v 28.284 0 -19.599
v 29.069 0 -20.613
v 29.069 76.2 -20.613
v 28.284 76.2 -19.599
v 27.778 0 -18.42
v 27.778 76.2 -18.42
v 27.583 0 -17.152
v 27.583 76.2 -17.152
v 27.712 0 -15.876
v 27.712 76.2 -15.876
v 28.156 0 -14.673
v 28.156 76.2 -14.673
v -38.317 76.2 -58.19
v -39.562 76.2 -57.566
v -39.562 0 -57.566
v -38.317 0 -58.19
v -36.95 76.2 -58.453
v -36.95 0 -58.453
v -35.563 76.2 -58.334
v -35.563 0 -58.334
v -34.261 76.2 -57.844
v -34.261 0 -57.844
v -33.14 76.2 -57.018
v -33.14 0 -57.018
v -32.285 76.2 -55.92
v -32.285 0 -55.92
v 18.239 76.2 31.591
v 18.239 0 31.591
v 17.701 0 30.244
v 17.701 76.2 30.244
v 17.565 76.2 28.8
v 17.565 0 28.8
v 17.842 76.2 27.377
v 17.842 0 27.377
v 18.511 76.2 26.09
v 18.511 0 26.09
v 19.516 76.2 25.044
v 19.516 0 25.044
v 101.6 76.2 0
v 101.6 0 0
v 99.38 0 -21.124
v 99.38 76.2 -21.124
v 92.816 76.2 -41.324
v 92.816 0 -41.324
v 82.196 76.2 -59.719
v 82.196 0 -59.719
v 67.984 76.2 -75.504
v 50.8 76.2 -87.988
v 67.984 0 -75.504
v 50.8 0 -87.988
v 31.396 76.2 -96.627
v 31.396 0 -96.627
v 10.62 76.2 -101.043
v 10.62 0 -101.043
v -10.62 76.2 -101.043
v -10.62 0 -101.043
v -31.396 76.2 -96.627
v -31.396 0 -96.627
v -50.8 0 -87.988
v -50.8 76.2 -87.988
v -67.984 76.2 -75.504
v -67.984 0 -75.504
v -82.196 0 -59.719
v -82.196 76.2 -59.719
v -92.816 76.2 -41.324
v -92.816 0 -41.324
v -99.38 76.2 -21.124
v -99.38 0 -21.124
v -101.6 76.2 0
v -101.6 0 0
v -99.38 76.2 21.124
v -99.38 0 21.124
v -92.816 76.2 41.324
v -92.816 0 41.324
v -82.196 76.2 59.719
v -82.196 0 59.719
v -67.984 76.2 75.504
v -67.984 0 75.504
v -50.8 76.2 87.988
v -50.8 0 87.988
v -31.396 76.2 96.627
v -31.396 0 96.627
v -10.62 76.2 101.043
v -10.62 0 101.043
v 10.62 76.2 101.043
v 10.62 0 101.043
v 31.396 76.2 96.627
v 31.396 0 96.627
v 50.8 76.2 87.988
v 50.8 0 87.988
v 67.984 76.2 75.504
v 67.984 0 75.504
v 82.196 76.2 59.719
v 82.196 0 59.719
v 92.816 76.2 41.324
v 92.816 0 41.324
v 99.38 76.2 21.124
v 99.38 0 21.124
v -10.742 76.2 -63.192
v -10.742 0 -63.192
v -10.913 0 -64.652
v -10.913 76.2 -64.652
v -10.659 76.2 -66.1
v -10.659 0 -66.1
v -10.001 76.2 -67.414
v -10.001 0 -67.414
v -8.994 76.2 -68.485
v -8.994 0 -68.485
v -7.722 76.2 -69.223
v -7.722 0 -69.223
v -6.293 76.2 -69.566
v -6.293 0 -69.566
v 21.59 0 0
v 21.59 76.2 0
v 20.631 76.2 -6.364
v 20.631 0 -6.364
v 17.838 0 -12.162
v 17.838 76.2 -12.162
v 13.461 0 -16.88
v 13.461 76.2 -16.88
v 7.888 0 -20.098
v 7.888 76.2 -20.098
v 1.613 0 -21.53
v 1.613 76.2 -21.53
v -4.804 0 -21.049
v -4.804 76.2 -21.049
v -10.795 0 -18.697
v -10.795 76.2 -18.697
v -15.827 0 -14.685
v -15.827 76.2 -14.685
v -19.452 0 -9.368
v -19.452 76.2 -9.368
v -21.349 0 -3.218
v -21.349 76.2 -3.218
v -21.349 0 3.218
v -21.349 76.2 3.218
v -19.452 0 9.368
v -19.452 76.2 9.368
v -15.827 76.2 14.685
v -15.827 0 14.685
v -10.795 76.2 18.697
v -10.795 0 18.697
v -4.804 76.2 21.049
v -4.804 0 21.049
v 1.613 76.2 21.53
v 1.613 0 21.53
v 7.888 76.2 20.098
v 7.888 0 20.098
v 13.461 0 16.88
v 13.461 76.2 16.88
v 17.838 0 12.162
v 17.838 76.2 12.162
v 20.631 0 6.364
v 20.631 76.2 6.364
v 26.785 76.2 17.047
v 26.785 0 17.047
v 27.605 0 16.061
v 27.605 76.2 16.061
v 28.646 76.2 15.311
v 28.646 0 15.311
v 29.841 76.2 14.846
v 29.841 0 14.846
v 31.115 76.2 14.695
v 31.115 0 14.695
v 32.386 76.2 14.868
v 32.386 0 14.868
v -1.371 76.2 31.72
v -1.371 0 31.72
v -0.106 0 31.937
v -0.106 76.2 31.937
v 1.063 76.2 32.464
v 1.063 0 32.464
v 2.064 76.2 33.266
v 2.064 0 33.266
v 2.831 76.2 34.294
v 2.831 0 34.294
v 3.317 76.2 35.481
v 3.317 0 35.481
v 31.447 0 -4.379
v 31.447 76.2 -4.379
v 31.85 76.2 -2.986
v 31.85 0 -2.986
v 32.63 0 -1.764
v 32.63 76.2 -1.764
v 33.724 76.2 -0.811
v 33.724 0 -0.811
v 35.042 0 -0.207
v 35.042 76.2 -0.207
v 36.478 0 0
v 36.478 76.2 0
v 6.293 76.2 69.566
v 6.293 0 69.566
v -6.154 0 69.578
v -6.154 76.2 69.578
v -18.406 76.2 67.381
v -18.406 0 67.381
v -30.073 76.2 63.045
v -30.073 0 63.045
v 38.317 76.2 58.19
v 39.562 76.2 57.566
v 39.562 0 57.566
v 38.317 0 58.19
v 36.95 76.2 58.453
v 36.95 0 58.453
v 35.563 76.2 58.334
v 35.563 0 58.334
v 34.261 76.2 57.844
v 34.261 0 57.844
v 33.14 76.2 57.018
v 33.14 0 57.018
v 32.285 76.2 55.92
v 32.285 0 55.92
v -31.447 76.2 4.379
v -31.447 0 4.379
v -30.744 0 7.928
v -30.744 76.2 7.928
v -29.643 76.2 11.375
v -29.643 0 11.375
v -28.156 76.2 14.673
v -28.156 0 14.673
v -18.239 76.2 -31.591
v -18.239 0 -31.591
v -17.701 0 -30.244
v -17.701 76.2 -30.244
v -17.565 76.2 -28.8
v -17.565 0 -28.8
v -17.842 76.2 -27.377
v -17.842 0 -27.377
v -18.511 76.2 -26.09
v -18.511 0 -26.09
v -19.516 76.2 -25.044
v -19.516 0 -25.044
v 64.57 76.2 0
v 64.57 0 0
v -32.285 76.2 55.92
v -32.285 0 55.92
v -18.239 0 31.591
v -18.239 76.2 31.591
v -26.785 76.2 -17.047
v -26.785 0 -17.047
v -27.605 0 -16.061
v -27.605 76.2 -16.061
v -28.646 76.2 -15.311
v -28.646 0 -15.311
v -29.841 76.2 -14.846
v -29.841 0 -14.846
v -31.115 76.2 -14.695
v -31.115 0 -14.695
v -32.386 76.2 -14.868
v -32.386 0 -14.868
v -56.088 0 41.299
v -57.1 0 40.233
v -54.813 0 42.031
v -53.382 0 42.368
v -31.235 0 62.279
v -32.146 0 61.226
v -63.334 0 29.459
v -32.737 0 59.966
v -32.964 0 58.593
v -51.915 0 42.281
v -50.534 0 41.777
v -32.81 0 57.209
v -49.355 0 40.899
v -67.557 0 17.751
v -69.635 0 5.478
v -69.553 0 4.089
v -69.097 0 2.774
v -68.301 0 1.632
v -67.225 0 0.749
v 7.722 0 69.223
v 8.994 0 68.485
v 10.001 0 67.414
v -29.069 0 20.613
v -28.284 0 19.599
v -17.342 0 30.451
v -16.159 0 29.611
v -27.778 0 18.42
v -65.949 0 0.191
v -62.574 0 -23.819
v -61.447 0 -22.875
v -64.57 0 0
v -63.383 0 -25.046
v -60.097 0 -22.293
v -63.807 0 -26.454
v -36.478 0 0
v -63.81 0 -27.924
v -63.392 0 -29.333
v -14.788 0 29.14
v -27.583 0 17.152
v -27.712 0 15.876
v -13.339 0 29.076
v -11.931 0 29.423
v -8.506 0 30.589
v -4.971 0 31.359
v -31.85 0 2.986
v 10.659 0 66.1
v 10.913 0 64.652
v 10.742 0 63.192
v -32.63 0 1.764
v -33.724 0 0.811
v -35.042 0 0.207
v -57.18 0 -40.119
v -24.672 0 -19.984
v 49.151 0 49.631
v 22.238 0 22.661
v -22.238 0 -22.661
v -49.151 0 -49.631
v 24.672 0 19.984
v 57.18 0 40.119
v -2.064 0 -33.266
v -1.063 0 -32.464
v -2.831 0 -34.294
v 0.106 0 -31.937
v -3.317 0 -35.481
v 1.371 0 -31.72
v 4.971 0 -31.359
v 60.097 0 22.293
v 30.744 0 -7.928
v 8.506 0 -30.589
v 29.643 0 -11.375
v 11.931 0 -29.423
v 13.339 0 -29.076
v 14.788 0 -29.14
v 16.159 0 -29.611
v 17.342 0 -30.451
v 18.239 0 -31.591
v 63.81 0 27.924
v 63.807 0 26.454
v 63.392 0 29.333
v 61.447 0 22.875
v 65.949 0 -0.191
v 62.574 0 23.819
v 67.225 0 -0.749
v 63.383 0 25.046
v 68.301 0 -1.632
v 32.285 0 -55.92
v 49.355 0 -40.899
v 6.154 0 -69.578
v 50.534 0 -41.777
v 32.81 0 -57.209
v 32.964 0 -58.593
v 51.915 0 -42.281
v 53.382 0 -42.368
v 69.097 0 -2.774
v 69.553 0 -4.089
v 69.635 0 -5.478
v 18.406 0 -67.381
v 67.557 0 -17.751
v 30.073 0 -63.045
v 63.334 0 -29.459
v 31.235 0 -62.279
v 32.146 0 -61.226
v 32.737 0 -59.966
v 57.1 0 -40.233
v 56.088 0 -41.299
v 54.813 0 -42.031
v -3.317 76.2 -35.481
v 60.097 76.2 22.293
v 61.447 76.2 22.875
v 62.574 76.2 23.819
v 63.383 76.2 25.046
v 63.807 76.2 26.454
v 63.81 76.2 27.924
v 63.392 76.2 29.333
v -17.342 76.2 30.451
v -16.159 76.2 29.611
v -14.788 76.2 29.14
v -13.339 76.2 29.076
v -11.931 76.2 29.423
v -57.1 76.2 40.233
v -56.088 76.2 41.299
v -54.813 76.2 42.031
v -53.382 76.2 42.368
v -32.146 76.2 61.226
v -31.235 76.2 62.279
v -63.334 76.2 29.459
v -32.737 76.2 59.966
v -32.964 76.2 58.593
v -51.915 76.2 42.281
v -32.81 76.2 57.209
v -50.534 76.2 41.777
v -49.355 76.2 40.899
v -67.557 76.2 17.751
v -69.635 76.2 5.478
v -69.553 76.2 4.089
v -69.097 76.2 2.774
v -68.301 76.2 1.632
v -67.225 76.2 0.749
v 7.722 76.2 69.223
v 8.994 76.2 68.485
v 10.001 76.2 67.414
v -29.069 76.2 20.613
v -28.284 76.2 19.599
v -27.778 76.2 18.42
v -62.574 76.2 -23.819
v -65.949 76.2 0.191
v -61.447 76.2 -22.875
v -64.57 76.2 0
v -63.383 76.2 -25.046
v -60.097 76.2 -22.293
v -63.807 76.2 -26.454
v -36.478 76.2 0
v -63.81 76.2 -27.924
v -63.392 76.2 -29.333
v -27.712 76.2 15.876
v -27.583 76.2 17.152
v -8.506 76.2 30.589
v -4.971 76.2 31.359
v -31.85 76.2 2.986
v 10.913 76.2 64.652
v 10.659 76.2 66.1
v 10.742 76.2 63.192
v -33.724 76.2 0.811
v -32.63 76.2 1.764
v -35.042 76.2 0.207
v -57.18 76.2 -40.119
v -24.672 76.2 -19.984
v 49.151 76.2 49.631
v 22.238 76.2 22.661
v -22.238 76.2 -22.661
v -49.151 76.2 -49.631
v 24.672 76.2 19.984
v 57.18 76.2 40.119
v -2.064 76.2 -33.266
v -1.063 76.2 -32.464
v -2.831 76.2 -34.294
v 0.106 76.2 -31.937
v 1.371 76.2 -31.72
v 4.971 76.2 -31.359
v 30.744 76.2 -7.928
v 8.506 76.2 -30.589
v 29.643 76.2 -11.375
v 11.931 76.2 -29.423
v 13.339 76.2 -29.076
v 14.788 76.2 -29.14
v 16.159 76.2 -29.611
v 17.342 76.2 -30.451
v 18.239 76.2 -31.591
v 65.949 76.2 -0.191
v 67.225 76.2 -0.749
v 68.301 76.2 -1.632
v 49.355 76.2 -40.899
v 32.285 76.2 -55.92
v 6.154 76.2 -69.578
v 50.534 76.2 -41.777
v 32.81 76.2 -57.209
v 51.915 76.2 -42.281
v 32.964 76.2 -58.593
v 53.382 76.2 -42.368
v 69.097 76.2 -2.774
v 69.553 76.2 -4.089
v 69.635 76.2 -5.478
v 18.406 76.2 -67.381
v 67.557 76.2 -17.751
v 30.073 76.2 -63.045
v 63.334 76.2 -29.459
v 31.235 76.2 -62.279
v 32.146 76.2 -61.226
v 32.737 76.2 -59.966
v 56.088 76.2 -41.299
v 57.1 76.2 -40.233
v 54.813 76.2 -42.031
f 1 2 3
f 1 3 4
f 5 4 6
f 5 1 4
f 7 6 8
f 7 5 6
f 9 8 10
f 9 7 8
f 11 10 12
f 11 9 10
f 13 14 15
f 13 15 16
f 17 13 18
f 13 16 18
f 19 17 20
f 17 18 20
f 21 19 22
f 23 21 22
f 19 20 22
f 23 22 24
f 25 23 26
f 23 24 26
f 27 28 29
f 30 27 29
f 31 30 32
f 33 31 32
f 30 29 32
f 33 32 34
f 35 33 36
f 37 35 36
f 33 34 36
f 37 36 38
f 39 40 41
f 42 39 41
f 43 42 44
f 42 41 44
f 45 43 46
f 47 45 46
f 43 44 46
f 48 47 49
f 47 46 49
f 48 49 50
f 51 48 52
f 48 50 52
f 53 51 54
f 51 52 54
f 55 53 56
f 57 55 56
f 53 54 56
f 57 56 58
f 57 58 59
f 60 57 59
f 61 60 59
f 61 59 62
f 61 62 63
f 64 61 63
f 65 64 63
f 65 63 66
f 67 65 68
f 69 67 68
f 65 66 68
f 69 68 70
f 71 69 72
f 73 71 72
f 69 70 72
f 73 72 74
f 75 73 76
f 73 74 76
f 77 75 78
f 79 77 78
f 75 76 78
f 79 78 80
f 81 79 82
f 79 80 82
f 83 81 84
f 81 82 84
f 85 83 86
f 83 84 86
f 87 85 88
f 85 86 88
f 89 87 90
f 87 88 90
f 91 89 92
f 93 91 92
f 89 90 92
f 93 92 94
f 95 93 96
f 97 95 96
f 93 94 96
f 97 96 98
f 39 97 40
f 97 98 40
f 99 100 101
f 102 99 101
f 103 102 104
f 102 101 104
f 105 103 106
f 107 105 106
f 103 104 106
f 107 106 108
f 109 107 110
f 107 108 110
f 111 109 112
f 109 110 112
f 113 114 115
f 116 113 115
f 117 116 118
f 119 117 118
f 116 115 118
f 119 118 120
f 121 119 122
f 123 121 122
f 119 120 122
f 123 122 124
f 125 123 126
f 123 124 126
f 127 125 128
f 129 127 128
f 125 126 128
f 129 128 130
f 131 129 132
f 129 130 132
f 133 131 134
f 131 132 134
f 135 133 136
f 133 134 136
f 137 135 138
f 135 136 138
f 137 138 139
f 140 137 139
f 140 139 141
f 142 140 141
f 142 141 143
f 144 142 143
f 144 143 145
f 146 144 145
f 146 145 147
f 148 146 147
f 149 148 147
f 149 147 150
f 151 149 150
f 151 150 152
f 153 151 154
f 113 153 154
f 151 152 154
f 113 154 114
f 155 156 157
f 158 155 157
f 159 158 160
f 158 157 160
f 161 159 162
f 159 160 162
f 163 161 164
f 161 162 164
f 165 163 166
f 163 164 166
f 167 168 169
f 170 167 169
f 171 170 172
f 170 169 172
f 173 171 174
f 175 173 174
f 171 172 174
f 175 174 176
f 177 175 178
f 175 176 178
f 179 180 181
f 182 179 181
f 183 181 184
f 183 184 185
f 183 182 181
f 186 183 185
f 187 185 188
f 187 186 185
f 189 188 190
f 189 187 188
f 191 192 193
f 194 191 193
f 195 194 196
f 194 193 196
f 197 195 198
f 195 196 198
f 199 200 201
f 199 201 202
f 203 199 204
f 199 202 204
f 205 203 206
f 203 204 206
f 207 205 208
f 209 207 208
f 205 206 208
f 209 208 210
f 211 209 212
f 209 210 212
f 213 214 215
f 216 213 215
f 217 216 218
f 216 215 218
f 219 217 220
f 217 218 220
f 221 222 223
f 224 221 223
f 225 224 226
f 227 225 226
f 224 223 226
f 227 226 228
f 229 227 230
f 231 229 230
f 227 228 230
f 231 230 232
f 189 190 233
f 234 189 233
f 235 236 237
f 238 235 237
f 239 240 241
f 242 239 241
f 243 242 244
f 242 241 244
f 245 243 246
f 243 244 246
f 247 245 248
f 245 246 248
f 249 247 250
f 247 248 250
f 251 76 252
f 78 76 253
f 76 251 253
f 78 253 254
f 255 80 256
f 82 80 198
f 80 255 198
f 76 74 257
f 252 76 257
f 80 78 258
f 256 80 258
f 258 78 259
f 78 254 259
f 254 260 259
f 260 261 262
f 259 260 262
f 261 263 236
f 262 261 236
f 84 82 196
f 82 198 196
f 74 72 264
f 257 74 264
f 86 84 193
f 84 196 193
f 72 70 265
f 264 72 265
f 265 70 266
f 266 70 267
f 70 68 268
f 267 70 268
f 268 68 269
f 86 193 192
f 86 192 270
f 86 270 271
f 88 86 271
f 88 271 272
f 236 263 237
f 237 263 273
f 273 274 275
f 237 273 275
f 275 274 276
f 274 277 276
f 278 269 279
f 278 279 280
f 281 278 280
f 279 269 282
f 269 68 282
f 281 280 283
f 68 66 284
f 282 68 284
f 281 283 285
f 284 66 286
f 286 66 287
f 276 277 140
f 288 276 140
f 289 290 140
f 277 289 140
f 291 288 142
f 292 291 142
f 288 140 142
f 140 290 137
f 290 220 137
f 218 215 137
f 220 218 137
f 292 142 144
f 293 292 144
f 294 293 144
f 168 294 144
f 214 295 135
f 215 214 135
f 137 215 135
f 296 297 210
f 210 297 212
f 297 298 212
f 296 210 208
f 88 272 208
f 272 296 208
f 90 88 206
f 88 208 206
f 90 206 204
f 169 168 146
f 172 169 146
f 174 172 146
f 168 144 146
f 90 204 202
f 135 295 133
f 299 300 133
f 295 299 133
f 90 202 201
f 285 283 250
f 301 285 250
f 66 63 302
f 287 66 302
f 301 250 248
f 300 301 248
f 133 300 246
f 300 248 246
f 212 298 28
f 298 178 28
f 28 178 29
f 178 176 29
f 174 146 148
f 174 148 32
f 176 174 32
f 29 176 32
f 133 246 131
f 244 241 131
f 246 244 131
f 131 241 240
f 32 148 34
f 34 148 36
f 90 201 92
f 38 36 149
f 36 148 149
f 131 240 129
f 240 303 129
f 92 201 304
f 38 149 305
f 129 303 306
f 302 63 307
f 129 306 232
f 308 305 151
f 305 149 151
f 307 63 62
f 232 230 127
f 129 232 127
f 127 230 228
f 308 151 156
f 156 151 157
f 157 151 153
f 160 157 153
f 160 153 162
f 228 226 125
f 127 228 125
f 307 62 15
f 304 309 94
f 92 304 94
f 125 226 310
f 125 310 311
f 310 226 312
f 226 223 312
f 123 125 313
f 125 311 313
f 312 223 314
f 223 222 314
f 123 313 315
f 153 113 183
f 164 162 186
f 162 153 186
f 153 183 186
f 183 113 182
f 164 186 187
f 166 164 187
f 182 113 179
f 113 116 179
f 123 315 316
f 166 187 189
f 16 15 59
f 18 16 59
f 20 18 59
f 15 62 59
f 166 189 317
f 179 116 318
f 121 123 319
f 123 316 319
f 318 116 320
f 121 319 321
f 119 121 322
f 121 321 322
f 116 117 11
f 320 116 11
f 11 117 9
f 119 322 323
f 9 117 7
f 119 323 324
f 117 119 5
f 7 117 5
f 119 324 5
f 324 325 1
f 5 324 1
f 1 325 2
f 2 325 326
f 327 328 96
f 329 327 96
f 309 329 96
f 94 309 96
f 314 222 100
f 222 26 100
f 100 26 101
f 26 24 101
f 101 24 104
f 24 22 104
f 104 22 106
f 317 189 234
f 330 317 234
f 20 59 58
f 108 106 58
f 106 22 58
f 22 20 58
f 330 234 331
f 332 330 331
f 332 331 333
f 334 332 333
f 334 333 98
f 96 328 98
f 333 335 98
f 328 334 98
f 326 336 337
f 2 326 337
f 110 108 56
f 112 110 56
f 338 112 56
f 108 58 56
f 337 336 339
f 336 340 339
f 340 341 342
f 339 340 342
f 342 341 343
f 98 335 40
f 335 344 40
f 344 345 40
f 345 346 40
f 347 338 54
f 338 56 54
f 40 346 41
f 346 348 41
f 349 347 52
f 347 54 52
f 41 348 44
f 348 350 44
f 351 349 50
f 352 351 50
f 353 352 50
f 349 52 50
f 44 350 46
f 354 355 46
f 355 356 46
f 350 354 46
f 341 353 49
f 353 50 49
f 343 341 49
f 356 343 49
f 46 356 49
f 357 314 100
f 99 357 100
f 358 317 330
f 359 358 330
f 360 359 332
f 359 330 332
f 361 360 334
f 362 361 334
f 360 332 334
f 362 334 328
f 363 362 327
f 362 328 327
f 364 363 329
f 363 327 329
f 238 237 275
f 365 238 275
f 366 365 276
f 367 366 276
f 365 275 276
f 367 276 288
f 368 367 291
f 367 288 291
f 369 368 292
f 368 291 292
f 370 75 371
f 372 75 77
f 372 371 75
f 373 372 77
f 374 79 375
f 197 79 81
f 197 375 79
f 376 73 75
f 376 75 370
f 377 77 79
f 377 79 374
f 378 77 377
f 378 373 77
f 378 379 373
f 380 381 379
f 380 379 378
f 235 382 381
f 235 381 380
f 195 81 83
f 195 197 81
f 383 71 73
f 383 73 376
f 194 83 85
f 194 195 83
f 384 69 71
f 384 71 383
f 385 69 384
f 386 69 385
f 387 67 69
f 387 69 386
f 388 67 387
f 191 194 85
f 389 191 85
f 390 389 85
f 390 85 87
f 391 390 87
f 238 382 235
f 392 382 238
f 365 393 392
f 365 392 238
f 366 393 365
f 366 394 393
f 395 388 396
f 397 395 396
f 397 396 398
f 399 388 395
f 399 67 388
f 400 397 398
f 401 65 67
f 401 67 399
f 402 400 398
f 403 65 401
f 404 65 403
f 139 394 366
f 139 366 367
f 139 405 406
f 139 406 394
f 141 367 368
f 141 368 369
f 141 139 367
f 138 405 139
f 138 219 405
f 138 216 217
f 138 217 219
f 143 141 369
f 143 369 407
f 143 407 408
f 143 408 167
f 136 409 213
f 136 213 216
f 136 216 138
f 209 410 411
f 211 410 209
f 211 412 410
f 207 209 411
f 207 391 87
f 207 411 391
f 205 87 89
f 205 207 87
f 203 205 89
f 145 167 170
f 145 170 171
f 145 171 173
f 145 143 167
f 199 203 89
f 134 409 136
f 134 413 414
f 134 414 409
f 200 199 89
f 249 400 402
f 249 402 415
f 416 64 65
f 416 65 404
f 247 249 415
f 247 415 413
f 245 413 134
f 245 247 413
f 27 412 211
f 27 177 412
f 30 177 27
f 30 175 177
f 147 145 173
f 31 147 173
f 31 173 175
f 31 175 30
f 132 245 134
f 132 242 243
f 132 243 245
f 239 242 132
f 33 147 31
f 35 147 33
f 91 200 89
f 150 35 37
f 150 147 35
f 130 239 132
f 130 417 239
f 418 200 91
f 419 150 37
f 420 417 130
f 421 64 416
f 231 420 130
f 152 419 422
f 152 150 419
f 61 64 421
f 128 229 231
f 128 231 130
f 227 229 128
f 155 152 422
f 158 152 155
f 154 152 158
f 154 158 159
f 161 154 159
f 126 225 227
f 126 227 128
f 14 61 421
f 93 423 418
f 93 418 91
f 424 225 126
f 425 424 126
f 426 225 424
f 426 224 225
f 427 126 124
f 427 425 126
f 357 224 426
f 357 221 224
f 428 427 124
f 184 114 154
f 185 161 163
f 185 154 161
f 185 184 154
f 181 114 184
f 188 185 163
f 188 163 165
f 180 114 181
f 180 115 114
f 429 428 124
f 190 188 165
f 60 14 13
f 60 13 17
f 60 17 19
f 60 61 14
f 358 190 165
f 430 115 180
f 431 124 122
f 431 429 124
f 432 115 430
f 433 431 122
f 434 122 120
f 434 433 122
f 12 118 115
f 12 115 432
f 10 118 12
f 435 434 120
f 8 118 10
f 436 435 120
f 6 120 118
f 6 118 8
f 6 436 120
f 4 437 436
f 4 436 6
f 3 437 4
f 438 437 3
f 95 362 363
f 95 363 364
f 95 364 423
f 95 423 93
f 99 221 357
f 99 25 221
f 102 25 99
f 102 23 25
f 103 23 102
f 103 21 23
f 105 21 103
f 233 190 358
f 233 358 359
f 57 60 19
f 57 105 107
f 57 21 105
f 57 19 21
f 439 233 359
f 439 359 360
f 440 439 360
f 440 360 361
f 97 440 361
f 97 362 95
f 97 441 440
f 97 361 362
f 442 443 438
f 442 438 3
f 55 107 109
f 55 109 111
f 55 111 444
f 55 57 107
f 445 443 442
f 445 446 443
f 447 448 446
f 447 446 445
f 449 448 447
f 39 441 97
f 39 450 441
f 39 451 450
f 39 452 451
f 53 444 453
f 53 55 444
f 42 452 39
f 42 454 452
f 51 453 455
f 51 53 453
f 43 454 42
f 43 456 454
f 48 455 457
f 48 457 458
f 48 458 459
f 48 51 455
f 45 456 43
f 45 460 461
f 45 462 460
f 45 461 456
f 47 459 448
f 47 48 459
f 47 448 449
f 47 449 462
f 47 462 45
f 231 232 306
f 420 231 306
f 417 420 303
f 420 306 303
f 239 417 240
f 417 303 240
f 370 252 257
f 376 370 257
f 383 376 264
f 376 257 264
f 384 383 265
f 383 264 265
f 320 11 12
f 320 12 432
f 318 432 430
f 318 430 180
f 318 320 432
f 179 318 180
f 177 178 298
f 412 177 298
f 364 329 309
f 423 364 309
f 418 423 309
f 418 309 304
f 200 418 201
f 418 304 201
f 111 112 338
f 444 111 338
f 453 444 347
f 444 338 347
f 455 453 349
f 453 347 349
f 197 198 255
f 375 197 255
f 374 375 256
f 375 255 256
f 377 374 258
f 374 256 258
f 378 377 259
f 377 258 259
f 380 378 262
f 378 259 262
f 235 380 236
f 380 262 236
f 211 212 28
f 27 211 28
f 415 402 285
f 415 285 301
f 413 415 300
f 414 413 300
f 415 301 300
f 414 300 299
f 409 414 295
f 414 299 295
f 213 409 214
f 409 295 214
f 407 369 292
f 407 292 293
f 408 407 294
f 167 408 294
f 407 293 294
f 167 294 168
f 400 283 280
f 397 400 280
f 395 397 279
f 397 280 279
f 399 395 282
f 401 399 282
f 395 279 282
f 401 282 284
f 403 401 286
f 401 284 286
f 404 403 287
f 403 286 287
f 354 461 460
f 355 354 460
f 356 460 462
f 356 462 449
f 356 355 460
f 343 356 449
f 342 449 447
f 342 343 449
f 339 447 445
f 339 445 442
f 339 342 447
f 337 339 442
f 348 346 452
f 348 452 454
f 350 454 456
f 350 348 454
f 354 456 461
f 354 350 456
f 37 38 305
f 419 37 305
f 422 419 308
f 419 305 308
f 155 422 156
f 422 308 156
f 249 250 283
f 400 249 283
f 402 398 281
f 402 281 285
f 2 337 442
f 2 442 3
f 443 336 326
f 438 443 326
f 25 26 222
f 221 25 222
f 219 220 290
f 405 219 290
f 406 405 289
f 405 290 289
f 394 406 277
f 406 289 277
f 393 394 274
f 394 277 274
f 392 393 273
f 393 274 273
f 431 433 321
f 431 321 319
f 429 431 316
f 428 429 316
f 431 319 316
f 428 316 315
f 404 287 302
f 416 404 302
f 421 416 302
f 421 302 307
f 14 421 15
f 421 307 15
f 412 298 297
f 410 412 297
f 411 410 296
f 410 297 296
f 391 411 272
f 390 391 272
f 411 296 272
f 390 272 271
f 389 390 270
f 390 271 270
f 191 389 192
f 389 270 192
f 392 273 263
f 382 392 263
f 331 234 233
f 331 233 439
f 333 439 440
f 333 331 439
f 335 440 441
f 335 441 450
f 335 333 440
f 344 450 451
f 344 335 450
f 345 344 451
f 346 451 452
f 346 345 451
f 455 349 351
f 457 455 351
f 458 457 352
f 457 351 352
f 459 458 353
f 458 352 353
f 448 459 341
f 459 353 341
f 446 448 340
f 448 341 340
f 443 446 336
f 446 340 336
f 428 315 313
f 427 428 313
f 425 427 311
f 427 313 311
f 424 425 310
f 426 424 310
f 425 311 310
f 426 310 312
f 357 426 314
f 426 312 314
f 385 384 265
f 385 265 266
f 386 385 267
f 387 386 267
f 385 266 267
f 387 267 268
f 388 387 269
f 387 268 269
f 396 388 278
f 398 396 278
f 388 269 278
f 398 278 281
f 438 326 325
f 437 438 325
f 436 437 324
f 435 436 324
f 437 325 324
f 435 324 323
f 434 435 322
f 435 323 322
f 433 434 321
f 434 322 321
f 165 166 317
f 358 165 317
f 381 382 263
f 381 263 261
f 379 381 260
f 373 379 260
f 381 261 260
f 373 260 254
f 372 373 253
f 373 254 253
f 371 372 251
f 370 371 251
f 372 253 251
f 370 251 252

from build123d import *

# Parameters (mm, degrees)
SKETCH1_R           = 101.6
BOSS_EXTRUDE2_DEPTH = 76.2
SKETCH2_R           = 21.59
CUT_EXTRUDE1_DEPTH  = 76.2


with BuildPart() as part:
    # Sketch1 → Boss-Extrude2 (new body)
    with BuildSketch(Plane(origin=(0, 0, 0), x_dir=(1, 0, 0), z_dir=(0, 1, 0))):
        Circle(SKETCH1_R)
        with BuildLine():
            Line((36.477972806, 0), (64.570477, 0))
            ThreePointArc((64.570477, 0), (68.300787401, 1.631640344), (69.634828137, 5.478431373))
            ThreePointArc((69.634828137, 5.478431373), (65.706637707, 23.699372591), (57.099502026, 40.232690295))
            ThreePointArc((57.099502026, 40.232690295), (53.382107886, 42.367992154), (49.354708521, 40.898778904))
            Line((49.354708521, 40.898778904), (29.068878602, 20.612948985))
            ThreePointArc((29.068878602, 20.612948985), (27.639931466, 17.792507776), (28.156018147, 14.673143566))
            ThreePointArc((28.156018147, 14.673143566), (30.242464115, 9.667257328), (31.446528281, 4.379310345))
            ThreePointArc((31.446528281, 4.379310345), (33.142789411, 1.24816601), (36.477972806, 0))
        make_face(mode=Mode.SUBTRACT)
        with BuildLine():
            Line((32.385776769, -14.867912836), (60.096735775, -22.293041923))
            ThreePointArc((60.096735775, -22.293041923), (63.382811455, -25.04626546), (63.392282871, -29.33327415))
            ThreePointArc((63.392282871, -29.33327415), (53.377577571, -45.053931156), (39.56187481, -57.566314469))
            ThreePointArc((39.56187481, -57.566314469), (35.563435689, -58.334396815), (32.2852385, -55.919673416))
            Line((32.2852385, -55.919673416), (18.238986403, -31.590851128))
            ThreePointArc((18.238986403, -31.590851128), (17.652338179, -28.078414577), (19.51585815, -25.043837179))
            ThreePointArc((19.51585815, -25.043837179), (23.493322488, -21.357113533), (26.785324155, -17.047255202))
            ThreePointArc((26.785324155, -17.047255202), (29.228729464, -15.04062892), (32.385776769, -14.867912836))
        make_face(mode=Mode.SUBTRACT)
        with BuildLine():
            Line((3.316898167, -35.480861821), (10.742027254, -63.191820828))
            ThreePointArc((10.742027254, -63.191820828), (10.00070357, -67.414257614), (6.292780846, -69.565964445))
            ThreePointArc((6.292780846, -69.565964445), (-12.329060136, -68.753303747), (-30.072953327, -63.044745841))
            ThreePointArc((-30.072953327, -63.044745841), (-32.737351712, -59.96603716), (-32.2852385, -55.919673416))
            Line((-32.2852385, -55.919673416), (-18.238986403, -31.590851128))
            ThreePointArc((-18.238986403, -31.590851128), (-15.490451232, -29.326580587), (-11.930670131, -29.423147524))
            ThreePointArc((-11.930670131, -29.423147524), (-6.749141627, -31.024370861), (-1.370693992, -31.720398768))
            ThreePointArc((-1.370693992, -31.720398768), (1.588797998, -32.833136696), (3.316898167, -35.480861821))
        make_face(mode=Mode.SUBTRACT)
        with BuildLine():
            Line((-29.068878602, -20.612948985), (-49.354708521, -40.898778904))
            ThreePointArc((-49.354708521, -40.898778904), (-53.382107886, -42.367992154), (-57.099502026, -40.232690295))
            ThreePointArc((-57.099502026, -40.232690295), (-65.706637707, -23.699372591), (-69.634828137, -5.478431373))
            ThreePointArc((-69.634828137, -5.478431373), (-68.300787401, -1.631640344), (-64.570477, 0))
            Line((-64.570477, 0), (-36.477972806, 0))
            ThreePointArc((-36.477972806, 0), (-33.142789411, -1.24816601), (-31.446528281, -4.379310345))
            ThreePointArc((-31.446528281, -4.379310345), (-30.242464115, -9.667257328), (-28.156018147, -14.673143566))
            ThreePointArc((-28.156018147, -14.673143566), (-27.639931466, -17.792507776), (-29.068878602, -20.612948985))
        make_face(mode=Mode.SUBTRACT)
        with BuildLine():
            Line((-32.385776769, 14.867912836), (-60.096735775, 22.293041923))
            ThreePointArc((-60.096735775, 22.293041923), (-63.382811455, 25.04626546), (-63.392282871, 29.33327415))
            ThreePointArc((-63.392282871, 29.33327415), (-53.377577571, 45.053931156), (-39.56187481, 57.566314469))
            ThreePointArc((-39.56187481, 57.566314469), (-35.563435689, 58.334396815), (-32.2852385, 55.919673416))
            Line((-32.2852385, 55.919673416), (-18.238986403, 31.590851128))
            ThreePointArc((-18.238986403, 31.590851128), (-17.652338179, 28.078414577), (-19.51585815, 25.043837179))
            ThreePointArc((-19.51585815, 25.043837179), (-23.493322488, 21.357113533), (-26.785324155, 17.047255202))
            ThreePointArc((-26.785324155, 17.047255202), (-29.228729464, 15.04062892), (-32.385776769, 14.867912836))
        make_face(mode=Mode.SUBTRACT)
        with BuildLine():
            Line((-3.316898167, 35.480861821), (-10.742027254, 63.191820828))
            ThreePointArc((-10.742027254, 63.191820828), (-10.00070357, 67.414257614), (-6.292780846, 69.565964445))
            ThreePointArc((-6.292780846, 69.565964445), (12.329060136, 68.753303747), (30.072953327, 63.044745841))
            ThreePointArc((30.072953327, 63.044745841), (32.737351712, 59.96603716), (32.2852385, 55.919673416))
            Line((32.2852385, 55.919673416), (18.238986403, 31.590851128))
            ThreePointArc((18.238986403, 31.590851128), (15.490451232, 29.326580587), (11.930670131, 29.423147524))
            ThreePointArc((11.930670131, 29.423147524), (6.749141627, 31.024370861), (1.370693992, 31.720398768))
            ThreePointArc((1.370693992, 31.720398768), (-1.588797998, 32.833136696), (-3.316898167, 35.480861821))
        make_face(mode=Mode.SUBTRACT)
    extrude(amount=BOSS_EXTRUDE2_DEPTH)

    # Sketch2 → Cut-Extrude1 (cut)
    with BuildSketch(Plane(origin=(0, 76.2, 0), x_dir=(1, 0, 0), z_dir=(0, 1, 0))):
        Circle(SKETCH2_R)
    extrude(amount=-CUT_EXTRUDE1_DEPTH, mode=Mode.SUBTRACT)


solid = part.part
